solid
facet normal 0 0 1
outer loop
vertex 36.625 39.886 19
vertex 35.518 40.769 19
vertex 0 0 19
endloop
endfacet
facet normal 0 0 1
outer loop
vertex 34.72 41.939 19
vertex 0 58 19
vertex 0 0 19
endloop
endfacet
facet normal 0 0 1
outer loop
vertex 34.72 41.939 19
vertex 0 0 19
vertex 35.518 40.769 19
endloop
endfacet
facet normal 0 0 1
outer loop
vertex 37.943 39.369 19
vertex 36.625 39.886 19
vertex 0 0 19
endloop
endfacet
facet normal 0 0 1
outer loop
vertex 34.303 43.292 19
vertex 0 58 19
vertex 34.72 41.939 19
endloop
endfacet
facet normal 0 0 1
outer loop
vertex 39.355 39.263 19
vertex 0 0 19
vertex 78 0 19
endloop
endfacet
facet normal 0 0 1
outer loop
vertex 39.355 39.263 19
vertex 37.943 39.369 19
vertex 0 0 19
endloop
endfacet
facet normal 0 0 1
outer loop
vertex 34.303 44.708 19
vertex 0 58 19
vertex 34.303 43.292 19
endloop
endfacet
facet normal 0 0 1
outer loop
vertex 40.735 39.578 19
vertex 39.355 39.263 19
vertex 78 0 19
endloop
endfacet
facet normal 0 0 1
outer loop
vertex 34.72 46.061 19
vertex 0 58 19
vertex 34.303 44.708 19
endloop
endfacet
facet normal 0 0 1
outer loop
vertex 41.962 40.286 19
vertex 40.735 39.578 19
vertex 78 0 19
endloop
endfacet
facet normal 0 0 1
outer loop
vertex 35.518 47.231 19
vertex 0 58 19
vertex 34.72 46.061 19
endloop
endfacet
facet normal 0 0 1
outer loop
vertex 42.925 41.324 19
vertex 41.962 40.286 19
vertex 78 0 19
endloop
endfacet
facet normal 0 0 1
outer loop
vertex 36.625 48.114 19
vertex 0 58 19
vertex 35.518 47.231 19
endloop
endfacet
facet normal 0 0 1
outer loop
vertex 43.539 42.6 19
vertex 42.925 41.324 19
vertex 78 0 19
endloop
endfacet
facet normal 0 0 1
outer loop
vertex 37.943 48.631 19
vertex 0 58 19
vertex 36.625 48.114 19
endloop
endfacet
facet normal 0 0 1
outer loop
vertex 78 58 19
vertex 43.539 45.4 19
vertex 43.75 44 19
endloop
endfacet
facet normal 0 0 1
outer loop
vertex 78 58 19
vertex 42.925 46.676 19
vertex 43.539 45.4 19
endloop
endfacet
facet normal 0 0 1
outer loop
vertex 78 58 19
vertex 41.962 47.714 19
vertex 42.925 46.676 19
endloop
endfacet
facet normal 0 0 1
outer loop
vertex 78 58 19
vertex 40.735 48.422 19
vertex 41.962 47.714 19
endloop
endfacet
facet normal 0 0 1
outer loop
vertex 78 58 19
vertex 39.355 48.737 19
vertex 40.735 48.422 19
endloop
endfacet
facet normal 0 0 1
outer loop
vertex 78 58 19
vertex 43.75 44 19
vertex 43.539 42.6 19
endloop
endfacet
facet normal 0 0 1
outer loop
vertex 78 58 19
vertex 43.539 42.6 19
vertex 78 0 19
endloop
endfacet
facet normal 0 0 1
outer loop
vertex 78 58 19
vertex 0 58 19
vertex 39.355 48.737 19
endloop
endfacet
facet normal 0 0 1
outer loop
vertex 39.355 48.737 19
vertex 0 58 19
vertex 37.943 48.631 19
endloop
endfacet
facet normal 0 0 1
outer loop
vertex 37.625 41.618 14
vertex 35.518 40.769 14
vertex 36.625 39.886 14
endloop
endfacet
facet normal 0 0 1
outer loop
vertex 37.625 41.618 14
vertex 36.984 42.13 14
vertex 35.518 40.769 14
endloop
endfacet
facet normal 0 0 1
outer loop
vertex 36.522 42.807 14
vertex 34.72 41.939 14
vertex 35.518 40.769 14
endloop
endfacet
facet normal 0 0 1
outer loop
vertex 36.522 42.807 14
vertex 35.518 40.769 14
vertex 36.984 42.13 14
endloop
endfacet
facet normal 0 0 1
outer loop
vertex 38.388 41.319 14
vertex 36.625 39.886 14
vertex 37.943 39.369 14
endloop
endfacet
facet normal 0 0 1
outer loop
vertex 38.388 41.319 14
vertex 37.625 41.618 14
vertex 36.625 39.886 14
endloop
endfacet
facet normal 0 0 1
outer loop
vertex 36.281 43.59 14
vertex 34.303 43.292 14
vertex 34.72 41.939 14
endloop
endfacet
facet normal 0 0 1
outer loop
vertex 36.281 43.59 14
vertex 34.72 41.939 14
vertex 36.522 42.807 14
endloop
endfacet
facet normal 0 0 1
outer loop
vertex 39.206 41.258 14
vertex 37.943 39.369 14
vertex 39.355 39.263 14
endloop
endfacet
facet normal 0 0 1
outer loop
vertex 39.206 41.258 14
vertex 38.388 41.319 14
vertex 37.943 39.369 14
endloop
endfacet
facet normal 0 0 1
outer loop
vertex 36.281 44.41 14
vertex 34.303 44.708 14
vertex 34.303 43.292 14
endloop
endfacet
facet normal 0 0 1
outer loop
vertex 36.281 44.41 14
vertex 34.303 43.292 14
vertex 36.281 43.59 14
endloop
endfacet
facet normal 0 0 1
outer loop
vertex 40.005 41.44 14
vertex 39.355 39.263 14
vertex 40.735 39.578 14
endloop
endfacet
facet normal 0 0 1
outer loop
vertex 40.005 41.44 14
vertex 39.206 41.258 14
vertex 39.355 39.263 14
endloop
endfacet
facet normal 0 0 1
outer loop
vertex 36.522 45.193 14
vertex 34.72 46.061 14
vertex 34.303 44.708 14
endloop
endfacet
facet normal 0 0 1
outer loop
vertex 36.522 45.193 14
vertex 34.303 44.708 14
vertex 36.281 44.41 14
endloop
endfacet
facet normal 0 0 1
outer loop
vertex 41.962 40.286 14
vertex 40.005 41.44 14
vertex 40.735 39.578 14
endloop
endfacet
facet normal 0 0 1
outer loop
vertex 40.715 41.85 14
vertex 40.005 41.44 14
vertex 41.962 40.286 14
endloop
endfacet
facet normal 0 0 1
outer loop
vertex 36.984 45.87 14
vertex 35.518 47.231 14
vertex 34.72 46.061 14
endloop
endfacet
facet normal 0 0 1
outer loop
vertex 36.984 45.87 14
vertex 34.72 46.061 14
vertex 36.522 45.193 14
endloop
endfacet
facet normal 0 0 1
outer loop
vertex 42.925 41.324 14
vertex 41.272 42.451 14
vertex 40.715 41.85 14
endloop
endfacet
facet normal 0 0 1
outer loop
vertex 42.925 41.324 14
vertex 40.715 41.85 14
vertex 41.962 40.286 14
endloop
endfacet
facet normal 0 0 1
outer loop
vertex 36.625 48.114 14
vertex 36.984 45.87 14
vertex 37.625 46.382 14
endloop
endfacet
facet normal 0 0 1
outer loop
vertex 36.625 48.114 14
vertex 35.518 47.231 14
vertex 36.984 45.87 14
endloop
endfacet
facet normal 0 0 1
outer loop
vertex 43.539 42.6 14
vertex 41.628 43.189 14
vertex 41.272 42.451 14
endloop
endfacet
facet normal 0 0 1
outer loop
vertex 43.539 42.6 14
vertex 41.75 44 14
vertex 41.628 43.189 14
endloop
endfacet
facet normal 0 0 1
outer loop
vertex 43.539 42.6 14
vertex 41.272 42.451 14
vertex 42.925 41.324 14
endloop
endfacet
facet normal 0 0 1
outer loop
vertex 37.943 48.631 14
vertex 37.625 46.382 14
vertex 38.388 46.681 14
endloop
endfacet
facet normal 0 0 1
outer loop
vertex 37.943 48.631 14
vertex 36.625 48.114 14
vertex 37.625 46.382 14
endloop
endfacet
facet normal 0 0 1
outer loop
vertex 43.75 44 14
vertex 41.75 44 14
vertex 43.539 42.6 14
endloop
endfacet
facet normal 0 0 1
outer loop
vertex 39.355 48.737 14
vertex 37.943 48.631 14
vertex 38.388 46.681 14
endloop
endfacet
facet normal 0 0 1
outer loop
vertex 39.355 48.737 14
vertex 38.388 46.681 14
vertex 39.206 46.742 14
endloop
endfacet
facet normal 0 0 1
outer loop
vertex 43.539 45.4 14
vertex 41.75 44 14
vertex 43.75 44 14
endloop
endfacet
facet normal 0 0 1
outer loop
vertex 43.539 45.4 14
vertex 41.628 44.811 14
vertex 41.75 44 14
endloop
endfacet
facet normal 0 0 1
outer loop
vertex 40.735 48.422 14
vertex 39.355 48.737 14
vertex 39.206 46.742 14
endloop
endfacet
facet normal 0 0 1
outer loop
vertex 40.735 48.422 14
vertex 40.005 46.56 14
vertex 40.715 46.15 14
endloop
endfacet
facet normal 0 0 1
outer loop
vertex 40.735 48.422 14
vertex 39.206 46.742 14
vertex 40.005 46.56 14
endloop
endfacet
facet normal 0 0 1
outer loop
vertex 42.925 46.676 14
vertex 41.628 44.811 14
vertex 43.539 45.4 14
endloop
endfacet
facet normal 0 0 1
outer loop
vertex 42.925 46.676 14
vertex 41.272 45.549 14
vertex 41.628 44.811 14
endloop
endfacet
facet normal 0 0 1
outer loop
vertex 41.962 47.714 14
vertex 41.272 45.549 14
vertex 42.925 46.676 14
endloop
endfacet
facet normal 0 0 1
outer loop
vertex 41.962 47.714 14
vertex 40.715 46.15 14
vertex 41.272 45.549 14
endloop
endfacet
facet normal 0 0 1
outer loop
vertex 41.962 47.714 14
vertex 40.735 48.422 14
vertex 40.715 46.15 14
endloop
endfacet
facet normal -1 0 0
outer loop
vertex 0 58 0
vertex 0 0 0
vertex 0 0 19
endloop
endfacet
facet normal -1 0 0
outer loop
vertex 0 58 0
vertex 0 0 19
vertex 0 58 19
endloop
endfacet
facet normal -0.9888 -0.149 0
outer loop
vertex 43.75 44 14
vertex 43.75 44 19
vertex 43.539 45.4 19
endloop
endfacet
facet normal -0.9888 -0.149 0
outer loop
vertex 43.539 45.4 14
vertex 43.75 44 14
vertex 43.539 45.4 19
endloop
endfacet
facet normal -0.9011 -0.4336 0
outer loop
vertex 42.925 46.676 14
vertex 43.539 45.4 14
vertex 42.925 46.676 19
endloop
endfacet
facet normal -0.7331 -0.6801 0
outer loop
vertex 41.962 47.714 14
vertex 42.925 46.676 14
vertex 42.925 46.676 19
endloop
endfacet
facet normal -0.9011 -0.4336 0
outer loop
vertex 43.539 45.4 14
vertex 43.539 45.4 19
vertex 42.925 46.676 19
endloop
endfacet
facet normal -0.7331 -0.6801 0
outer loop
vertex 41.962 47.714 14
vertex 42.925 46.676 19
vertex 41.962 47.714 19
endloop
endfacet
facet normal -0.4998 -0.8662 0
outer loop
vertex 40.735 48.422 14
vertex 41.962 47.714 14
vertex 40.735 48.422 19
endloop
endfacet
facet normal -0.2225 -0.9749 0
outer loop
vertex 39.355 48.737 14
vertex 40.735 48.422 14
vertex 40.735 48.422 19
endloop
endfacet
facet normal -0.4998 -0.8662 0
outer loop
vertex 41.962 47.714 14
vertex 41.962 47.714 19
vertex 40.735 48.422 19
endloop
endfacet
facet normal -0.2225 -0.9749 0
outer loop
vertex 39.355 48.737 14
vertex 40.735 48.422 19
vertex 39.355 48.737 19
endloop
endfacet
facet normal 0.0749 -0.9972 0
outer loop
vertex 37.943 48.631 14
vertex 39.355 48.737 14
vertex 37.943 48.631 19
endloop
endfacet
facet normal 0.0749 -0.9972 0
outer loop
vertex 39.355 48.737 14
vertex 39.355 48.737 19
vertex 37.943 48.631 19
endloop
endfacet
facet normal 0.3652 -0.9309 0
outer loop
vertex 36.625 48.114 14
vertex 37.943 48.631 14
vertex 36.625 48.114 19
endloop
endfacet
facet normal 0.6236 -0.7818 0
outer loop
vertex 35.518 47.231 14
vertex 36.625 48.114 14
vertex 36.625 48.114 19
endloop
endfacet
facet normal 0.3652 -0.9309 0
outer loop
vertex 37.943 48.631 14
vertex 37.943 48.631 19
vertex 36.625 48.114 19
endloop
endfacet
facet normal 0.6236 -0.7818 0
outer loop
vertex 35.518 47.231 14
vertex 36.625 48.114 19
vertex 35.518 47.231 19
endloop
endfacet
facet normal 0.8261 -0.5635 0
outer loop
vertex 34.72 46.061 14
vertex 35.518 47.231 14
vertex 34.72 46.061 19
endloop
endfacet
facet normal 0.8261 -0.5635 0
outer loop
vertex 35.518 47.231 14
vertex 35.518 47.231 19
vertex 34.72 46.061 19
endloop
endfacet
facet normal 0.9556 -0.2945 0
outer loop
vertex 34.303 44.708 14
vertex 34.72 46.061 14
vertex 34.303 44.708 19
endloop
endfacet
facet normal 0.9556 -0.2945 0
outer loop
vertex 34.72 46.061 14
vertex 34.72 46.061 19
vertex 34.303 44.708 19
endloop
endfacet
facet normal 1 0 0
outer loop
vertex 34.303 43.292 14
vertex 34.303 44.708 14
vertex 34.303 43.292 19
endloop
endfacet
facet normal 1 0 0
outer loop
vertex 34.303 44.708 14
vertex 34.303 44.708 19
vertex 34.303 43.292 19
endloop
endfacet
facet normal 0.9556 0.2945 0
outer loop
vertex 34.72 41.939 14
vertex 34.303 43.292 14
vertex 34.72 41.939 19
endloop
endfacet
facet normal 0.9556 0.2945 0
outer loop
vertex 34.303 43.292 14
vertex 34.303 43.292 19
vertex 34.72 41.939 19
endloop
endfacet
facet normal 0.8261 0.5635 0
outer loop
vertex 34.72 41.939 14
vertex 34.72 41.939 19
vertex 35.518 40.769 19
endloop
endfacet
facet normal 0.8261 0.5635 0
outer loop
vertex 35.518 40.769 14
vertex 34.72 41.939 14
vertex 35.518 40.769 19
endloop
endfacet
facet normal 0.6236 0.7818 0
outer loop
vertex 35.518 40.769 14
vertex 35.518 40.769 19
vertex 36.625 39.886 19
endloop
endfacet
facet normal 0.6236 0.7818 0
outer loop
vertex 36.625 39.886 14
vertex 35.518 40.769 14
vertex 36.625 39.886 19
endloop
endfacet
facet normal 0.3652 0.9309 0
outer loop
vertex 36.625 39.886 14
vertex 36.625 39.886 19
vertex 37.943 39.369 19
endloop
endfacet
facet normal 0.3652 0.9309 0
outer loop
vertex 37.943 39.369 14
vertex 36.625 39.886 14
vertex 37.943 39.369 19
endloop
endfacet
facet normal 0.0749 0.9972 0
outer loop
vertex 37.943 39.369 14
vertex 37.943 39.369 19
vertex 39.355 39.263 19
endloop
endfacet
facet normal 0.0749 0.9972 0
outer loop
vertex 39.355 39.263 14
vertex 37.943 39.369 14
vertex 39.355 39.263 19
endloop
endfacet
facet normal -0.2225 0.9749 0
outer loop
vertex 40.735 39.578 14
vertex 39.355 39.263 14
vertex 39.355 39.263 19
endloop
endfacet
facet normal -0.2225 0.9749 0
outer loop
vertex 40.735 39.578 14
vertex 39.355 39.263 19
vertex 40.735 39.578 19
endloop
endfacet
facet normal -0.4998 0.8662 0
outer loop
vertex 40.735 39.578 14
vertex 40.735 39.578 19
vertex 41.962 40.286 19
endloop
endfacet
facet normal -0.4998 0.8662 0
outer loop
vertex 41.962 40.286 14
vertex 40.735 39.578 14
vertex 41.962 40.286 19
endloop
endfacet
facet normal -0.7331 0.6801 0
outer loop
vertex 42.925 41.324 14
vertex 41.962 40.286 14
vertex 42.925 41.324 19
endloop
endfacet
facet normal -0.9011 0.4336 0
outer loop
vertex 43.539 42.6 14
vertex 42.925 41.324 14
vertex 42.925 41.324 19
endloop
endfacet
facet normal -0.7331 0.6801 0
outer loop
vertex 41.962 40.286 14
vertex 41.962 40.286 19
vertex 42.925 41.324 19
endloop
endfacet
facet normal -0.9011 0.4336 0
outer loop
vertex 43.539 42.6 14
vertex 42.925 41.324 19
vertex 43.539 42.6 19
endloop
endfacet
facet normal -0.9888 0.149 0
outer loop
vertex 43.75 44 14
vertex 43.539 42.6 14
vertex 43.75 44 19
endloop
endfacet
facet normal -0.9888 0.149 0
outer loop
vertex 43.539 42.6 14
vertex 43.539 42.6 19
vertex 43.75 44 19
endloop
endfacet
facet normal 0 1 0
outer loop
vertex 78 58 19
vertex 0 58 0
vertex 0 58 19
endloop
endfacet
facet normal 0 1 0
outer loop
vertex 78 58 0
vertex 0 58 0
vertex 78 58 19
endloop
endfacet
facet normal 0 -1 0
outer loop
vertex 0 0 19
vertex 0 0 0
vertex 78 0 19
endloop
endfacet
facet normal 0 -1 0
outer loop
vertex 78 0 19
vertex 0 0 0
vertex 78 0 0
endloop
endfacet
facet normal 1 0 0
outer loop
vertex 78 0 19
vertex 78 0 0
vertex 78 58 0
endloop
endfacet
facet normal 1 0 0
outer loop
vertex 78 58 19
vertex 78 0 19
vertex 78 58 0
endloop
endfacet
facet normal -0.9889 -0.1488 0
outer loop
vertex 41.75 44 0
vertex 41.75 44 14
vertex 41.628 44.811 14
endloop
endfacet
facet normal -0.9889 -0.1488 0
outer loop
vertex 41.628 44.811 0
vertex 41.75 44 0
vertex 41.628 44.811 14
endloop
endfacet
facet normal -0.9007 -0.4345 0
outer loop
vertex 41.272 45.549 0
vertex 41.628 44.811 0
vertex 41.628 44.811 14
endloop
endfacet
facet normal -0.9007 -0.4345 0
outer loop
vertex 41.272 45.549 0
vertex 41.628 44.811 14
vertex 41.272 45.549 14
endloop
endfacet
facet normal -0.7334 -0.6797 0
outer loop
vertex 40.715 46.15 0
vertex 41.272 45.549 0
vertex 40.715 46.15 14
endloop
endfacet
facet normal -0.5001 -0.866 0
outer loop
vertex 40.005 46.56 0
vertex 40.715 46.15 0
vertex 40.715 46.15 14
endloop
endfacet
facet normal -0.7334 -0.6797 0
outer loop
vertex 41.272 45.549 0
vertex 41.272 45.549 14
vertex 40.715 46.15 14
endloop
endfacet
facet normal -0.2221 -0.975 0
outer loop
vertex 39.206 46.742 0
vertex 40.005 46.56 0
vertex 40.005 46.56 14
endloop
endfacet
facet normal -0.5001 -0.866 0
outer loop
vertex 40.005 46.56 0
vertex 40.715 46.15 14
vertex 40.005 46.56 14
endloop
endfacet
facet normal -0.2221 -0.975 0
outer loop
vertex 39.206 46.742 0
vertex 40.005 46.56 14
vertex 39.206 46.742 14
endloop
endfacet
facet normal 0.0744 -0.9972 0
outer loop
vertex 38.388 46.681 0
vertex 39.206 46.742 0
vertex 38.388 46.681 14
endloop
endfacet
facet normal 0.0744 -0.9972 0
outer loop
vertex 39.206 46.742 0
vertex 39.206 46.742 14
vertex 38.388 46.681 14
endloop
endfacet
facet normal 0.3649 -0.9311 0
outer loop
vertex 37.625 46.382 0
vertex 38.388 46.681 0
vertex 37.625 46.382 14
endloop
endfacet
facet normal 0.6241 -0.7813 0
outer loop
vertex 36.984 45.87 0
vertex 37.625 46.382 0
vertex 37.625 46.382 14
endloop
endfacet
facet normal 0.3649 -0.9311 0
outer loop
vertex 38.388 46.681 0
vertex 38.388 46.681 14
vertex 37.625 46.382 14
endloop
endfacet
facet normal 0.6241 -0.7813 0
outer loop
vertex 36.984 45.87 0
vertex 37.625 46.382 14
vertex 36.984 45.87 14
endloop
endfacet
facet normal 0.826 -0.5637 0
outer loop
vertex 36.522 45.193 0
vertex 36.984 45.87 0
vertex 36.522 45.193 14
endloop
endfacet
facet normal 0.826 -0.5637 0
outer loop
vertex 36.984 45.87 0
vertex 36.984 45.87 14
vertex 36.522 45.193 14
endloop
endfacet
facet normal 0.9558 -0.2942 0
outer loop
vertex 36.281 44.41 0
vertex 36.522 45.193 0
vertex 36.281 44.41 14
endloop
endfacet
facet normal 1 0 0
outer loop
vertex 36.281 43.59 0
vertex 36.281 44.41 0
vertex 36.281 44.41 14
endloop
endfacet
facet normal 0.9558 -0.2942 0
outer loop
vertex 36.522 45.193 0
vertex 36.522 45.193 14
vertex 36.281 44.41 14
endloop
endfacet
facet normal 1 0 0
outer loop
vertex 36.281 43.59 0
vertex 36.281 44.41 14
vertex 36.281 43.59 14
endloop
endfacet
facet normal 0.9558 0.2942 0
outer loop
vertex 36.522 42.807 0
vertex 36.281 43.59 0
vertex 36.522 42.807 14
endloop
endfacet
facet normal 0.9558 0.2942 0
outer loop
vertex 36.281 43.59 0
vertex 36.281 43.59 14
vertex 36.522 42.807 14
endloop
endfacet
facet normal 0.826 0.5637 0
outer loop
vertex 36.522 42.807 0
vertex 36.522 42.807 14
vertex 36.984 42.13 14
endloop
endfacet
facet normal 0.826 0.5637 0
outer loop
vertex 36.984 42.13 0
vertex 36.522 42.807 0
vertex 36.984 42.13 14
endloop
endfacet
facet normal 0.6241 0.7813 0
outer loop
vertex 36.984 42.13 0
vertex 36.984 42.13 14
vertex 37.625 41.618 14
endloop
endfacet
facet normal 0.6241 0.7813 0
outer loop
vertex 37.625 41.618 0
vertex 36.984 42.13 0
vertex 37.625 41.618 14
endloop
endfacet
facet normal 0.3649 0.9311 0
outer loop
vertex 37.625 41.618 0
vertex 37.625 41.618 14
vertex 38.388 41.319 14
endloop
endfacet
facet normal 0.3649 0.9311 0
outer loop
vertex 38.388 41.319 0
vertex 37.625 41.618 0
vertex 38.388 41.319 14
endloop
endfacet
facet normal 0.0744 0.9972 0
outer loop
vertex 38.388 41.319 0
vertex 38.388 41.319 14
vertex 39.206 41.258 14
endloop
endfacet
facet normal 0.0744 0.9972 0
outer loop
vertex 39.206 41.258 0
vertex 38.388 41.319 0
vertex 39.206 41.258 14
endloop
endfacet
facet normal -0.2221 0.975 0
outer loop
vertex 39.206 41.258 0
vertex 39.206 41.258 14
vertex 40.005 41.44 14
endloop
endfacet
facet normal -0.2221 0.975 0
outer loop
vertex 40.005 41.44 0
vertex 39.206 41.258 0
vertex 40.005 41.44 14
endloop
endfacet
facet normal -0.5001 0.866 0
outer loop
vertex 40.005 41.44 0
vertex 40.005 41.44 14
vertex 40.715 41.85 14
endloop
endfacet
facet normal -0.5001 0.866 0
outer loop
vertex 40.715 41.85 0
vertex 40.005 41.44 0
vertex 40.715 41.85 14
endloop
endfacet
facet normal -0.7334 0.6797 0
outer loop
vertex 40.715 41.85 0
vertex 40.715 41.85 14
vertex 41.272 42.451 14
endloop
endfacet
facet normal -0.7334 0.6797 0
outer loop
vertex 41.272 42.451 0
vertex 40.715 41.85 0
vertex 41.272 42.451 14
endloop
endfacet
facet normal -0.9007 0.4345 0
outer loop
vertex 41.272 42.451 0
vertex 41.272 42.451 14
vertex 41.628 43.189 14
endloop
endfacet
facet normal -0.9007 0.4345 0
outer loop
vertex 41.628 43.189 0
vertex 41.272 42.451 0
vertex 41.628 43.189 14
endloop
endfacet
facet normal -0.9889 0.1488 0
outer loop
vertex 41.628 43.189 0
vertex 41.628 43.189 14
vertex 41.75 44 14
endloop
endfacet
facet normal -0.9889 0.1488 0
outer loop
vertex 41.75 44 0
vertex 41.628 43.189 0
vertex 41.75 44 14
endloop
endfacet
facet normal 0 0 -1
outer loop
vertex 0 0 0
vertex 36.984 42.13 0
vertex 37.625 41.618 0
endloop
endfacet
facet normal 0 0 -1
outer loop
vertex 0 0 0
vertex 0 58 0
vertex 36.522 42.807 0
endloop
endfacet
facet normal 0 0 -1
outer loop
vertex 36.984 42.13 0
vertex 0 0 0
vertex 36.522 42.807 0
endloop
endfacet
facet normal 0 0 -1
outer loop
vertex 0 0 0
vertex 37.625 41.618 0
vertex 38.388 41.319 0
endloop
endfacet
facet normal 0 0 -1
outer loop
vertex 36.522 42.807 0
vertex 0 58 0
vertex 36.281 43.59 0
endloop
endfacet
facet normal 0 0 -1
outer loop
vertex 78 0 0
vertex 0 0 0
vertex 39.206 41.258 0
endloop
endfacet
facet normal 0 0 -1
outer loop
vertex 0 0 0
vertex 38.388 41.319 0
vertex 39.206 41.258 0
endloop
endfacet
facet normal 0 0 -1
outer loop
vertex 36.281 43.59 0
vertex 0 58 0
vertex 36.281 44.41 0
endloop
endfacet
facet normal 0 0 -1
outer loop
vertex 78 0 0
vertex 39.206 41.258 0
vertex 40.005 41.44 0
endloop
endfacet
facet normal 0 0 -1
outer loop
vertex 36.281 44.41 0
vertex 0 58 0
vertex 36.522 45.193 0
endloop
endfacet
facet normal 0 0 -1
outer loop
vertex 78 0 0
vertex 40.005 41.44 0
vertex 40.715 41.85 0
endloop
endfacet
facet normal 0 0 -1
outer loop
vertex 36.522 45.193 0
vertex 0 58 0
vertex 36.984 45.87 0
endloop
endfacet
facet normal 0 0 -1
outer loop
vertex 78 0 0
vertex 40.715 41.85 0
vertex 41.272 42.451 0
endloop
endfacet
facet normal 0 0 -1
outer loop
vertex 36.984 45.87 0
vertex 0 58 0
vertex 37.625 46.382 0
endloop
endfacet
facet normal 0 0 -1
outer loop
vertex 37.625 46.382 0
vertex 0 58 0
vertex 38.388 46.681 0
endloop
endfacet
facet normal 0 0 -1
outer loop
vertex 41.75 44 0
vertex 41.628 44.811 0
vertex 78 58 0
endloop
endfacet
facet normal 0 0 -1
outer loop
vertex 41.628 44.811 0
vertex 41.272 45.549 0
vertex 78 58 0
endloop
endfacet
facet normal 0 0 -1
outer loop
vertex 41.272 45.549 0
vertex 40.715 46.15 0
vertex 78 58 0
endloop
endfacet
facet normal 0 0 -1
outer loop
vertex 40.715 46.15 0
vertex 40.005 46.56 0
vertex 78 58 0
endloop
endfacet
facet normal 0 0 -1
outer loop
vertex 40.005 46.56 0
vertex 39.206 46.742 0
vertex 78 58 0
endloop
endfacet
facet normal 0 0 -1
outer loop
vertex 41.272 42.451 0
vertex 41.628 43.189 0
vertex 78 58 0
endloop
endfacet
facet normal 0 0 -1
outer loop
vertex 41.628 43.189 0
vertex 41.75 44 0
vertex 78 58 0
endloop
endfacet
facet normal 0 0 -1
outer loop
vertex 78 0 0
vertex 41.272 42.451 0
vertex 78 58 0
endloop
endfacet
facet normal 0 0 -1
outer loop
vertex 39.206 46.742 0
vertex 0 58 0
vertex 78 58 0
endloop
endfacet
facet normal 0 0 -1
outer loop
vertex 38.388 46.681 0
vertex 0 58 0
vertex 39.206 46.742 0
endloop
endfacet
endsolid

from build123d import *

# Parameters (mm, degrees)
SKETCH1_W           = 78
SKETCH1_H           = 58
BOSS_EXTRUDE1_DEPTH = 19
SKETCH2_R           = 4.75
CUT_EXTRUDE1_DEPTH  = 5
CUT_EXTRUDE2_START  = -5
SKETCH2_3_R         = 2.75
CUT_EXTRUDE2_DEPTH  = 95.040395799


with BuildPart() as part:
    # Sketch1 → Boss-Extrude1 (new body)
    with BuildSketch(Plane.XY):
        with Locations((39, 29)):
            Rectangle(SKETCH1_W, SKETCH1_H)
    extrude(amount=BOSS_EXTRUDE1_DEPTH)

    # Sketch2 → Cut-Extrude1 (cut)
    with BuildSketch(Plane.XY.offset(19)):
        with Locations((39, 44)):
            Circle(SKETCH2_R)
    extrude(amount=-CUT_EXTRUDE1_DEPTH, mode=Mode.SUBTRACT)

    # Sketch2<3> → Cut-Extrude2 (cut, through all)
    with BuildSketch(Plane.XY.offset(19).offset(CUT_EXTRUDE2_START)):
        with Locations((39, 44)):
            Circle(SKETCH2_3_R)
    extrude(amount=-CUT_EXTRUDE2_DEPTH, mode=Mode.SUBTRACT)


solid = part.part
